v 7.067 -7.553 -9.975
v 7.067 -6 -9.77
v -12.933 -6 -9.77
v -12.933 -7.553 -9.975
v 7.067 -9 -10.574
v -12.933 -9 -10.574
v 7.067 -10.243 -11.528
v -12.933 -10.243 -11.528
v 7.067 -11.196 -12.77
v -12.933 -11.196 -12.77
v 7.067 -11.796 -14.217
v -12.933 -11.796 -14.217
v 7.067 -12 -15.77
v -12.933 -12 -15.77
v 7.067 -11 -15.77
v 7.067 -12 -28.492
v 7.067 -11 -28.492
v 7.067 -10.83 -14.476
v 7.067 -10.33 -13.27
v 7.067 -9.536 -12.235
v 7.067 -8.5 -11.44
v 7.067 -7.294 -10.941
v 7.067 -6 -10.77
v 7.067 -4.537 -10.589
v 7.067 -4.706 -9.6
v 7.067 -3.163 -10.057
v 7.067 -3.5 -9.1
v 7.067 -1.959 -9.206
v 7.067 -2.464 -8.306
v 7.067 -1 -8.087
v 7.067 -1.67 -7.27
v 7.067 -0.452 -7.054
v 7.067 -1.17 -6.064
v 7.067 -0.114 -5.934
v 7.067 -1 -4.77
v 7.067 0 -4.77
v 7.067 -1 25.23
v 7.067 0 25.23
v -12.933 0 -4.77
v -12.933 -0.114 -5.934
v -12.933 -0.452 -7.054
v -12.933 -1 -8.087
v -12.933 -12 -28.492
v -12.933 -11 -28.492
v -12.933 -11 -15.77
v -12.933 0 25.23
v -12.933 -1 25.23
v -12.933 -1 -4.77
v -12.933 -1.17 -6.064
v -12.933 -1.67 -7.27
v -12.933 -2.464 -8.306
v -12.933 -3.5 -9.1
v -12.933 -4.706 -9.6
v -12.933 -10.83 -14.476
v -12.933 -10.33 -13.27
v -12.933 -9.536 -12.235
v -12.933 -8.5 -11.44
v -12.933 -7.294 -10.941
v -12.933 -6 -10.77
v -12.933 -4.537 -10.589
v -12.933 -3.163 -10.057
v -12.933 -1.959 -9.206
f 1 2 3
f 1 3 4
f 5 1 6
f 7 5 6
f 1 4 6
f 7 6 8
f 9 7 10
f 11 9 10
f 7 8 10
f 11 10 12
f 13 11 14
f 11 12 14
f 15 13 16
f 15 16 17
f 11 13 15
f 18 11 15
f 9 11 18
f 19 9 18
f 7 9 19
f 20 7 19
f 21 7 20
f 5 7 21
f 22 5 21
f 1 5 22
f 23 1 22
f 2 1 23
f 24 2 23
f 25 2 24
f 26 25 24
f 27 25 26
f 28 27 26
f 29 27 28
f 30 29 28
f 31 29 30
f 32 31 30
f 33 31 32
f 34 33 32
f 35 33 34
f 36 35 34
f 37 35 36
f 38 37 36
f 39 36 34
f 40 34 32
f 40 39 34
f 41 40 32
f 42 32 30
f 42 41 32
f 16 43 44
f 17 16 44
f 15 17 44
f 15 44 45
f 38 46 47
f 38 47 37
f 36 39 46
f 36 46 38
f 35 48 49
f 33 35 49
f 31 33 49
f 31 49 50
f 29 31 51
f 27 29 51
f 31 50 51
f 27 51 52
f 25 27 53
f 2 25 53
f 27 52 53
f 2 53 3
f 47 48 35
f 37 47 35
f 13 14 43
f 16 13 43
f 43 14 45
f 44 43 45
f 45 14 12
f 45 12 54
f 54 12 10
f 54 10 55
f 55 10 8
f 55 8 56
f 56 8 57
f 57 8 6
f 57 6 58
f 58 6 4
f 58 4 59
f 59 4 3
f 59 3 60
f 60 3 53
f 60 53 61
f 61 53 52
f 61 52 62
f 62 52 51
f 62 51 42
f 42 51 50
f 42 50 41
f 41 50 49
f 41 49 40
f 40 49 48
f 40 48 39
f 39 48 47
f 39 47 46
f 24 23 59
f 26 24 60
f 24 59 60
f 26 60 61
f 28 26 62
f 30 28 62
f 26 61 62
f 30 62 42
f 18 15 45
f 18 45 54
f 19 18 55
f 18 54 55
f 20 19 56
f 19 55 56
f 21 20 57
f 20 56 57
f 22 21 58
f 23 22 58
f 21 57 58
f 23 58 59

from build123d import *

# Parameters (mm, degrees)
SKETCH1_W          = 20
SKETCH1_H          = 60
BASE_FLANGE1_DEPTH = 1
JOG1_START         = -12.932862191
JOG1_DEPTH         = 20
JOG1_2_DEPTH       = 20


# Read off the part's stored shape, not the designer's step: Jog1
# Sheet-metal steps are written as plain solids
with BuildPart() as part:
    # Sketch1 → Base-Flange1 (new body)
    with BuildSketch(Plane(origin=(0, 0, 0), x_dir=(1, 0, 0), z_dir=(0, 1, 0))):
        with Locations((-2.932862191, 4.770318021)):
            Rectangle(SKETCH1_W, SKETCH1_H)
    extrude(amount=-BASE_FLANGE1_DEPTH)

    # Jog1 outline → Jog1 (cut)
    with BuildSketch(Plane.YZ.offset(JOG1_START)):
        with BuildLine():
            ThreePointArc((0, -4.770318021), (-0.255437354, -6.502368828), (-1, -8.086942811))
            Line((-1, -8.086942811), (-1, -34.770318021))
            Line((-1, -34.770318021), (0, -34.770318021))
            Line((0, -34.770318021), (0, -4.770318021))
        make_face()
    extrude(amount=JOG1_DEPTH, mode=Mode.SUBTRACT)

    # Jog1 2 outline → Jog1 2 (add)
    with BuildSketch(Plane.YZ.offset(JOG1_START)):
        with BuildLine():
            ThreePointArc((-1, -4.770318021), (-2.464466094, -8.305851927), (-6, -9.770318021))
            ThreePointArc((-6, -9.770318021), (-10.242640687, -11.527677334), (-12, -15.770318021))
            Line((-12, -15.770318021), (-12, -28.491558426))
            Line((-12, -28.491558426), (-11, -28.491558426))
            Line((-11, -28.491558426), (-11, -15.770318021))
            ThreePointArc((-11, -15.770318021), (-9.535533906, -12.234784115), (-6, -10.770318021))
            ThreePointArc((-6, -10.770318021), (-3.162725669, -10.057082095), (-1, -8.086942811))
            Line((-1, -8.086942811), (-1, -4.770318021))
        make_face()
    extrude(amount=JOG1_2_DEPTH)


solid = part.part
